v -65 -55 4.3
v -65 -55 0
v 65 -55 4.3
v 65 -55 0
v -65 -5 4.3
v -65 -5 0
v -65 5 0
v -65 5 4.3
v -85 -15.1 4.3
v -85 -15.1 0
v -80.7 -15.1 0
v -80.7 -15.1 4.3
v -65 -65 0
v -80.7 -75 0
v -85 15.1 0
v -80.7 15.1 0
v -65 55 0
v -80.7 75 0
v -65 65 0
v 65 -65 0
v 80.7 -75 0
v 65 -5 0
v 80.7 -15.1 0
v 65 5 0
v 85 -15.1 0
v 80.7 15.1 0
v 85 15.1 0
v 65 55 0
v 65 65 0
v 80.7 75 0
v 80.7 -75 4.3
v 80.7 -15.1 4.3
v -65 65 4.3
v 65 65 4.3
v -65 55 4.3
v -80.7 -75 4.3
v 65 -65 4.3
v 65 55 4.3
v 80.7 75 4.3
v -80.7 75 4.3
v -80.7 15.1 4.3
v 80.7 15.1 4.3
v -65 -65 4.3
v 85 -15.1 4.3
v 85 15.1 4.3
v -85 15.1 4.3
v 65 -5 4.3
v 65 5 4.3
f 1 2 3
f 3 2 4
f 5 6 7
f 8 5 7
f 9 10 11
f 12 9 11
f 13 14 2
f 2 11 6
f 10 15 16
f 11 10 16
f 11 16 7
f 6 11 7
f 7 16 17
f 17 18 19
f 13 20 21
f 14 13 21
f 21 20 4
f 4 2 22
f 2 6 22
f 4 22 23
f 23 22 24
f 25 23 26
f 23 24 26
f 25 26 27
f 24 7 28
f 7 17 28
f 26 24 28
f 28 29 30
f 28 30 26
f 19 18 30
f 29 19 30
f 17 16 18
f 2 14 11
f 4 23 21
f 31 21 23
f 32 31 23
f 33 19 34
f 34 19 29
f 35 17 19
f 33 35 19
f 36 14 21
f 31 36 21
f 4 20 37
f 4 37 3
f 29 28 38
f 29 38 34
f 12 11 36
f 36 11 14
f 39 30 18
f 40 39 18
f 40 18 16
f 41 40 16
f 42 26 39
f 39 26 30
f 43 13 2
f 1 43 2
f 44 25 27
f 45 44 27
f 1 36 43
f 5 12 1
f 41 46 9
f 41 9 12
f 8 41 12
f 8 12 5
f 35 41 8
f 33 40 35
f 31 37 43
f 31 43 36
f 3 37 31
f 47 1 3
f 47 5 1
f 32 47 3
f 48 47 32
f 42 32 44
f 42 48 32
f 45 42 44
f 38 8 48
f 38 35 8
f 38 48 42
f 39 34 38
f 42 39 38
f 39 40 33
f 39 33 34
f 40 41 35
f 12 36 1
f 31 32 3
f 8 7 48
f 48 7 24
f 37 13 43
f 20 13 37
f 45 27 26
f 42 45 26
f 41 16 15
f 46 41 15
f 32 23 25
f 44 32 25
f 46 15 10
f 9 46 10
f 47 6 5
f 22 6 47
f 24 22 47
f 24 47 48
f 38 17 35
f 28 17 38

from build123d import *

# Parameters (mm, degrees)
SKETCH1_W           = 130
SKETCH1_H           = 10
BOSS_EXTRUDE1_DEPTH = 4.3


with BuildPart() as part:
    # Sketch1 → Boss-Extrude1 (new body)
    with BuildSketch(Plane.XY):
        Polygon((80.7, 15.1), (80.7, 75), (-80.7, 75), (-80.7, 15.1), (-85, 15.1), (-85, -15.1), (-80.7, -15.1), (-80.7, -75), (80.7, -75), (80.7, -15.1), (85, -15.1), (85, 15.1), align=None)
        with Locations((0, 60)):
            Rectangle(SKETCH1_W, SKETCH1_H, mode=Mode.SUBTRACT)
        Rectangle(SKETCH1_W, SKETCH1_H, mode=Mode.SUBTRACT)
        with Locations((0, -60)):
            Rectangle(SKETCH1_W, SKETCH1_H, mode=Mode.SUBTRACT)
    extrude(amount=BOSS_EXTRUDE1_DEPTH)


solid = part.part
